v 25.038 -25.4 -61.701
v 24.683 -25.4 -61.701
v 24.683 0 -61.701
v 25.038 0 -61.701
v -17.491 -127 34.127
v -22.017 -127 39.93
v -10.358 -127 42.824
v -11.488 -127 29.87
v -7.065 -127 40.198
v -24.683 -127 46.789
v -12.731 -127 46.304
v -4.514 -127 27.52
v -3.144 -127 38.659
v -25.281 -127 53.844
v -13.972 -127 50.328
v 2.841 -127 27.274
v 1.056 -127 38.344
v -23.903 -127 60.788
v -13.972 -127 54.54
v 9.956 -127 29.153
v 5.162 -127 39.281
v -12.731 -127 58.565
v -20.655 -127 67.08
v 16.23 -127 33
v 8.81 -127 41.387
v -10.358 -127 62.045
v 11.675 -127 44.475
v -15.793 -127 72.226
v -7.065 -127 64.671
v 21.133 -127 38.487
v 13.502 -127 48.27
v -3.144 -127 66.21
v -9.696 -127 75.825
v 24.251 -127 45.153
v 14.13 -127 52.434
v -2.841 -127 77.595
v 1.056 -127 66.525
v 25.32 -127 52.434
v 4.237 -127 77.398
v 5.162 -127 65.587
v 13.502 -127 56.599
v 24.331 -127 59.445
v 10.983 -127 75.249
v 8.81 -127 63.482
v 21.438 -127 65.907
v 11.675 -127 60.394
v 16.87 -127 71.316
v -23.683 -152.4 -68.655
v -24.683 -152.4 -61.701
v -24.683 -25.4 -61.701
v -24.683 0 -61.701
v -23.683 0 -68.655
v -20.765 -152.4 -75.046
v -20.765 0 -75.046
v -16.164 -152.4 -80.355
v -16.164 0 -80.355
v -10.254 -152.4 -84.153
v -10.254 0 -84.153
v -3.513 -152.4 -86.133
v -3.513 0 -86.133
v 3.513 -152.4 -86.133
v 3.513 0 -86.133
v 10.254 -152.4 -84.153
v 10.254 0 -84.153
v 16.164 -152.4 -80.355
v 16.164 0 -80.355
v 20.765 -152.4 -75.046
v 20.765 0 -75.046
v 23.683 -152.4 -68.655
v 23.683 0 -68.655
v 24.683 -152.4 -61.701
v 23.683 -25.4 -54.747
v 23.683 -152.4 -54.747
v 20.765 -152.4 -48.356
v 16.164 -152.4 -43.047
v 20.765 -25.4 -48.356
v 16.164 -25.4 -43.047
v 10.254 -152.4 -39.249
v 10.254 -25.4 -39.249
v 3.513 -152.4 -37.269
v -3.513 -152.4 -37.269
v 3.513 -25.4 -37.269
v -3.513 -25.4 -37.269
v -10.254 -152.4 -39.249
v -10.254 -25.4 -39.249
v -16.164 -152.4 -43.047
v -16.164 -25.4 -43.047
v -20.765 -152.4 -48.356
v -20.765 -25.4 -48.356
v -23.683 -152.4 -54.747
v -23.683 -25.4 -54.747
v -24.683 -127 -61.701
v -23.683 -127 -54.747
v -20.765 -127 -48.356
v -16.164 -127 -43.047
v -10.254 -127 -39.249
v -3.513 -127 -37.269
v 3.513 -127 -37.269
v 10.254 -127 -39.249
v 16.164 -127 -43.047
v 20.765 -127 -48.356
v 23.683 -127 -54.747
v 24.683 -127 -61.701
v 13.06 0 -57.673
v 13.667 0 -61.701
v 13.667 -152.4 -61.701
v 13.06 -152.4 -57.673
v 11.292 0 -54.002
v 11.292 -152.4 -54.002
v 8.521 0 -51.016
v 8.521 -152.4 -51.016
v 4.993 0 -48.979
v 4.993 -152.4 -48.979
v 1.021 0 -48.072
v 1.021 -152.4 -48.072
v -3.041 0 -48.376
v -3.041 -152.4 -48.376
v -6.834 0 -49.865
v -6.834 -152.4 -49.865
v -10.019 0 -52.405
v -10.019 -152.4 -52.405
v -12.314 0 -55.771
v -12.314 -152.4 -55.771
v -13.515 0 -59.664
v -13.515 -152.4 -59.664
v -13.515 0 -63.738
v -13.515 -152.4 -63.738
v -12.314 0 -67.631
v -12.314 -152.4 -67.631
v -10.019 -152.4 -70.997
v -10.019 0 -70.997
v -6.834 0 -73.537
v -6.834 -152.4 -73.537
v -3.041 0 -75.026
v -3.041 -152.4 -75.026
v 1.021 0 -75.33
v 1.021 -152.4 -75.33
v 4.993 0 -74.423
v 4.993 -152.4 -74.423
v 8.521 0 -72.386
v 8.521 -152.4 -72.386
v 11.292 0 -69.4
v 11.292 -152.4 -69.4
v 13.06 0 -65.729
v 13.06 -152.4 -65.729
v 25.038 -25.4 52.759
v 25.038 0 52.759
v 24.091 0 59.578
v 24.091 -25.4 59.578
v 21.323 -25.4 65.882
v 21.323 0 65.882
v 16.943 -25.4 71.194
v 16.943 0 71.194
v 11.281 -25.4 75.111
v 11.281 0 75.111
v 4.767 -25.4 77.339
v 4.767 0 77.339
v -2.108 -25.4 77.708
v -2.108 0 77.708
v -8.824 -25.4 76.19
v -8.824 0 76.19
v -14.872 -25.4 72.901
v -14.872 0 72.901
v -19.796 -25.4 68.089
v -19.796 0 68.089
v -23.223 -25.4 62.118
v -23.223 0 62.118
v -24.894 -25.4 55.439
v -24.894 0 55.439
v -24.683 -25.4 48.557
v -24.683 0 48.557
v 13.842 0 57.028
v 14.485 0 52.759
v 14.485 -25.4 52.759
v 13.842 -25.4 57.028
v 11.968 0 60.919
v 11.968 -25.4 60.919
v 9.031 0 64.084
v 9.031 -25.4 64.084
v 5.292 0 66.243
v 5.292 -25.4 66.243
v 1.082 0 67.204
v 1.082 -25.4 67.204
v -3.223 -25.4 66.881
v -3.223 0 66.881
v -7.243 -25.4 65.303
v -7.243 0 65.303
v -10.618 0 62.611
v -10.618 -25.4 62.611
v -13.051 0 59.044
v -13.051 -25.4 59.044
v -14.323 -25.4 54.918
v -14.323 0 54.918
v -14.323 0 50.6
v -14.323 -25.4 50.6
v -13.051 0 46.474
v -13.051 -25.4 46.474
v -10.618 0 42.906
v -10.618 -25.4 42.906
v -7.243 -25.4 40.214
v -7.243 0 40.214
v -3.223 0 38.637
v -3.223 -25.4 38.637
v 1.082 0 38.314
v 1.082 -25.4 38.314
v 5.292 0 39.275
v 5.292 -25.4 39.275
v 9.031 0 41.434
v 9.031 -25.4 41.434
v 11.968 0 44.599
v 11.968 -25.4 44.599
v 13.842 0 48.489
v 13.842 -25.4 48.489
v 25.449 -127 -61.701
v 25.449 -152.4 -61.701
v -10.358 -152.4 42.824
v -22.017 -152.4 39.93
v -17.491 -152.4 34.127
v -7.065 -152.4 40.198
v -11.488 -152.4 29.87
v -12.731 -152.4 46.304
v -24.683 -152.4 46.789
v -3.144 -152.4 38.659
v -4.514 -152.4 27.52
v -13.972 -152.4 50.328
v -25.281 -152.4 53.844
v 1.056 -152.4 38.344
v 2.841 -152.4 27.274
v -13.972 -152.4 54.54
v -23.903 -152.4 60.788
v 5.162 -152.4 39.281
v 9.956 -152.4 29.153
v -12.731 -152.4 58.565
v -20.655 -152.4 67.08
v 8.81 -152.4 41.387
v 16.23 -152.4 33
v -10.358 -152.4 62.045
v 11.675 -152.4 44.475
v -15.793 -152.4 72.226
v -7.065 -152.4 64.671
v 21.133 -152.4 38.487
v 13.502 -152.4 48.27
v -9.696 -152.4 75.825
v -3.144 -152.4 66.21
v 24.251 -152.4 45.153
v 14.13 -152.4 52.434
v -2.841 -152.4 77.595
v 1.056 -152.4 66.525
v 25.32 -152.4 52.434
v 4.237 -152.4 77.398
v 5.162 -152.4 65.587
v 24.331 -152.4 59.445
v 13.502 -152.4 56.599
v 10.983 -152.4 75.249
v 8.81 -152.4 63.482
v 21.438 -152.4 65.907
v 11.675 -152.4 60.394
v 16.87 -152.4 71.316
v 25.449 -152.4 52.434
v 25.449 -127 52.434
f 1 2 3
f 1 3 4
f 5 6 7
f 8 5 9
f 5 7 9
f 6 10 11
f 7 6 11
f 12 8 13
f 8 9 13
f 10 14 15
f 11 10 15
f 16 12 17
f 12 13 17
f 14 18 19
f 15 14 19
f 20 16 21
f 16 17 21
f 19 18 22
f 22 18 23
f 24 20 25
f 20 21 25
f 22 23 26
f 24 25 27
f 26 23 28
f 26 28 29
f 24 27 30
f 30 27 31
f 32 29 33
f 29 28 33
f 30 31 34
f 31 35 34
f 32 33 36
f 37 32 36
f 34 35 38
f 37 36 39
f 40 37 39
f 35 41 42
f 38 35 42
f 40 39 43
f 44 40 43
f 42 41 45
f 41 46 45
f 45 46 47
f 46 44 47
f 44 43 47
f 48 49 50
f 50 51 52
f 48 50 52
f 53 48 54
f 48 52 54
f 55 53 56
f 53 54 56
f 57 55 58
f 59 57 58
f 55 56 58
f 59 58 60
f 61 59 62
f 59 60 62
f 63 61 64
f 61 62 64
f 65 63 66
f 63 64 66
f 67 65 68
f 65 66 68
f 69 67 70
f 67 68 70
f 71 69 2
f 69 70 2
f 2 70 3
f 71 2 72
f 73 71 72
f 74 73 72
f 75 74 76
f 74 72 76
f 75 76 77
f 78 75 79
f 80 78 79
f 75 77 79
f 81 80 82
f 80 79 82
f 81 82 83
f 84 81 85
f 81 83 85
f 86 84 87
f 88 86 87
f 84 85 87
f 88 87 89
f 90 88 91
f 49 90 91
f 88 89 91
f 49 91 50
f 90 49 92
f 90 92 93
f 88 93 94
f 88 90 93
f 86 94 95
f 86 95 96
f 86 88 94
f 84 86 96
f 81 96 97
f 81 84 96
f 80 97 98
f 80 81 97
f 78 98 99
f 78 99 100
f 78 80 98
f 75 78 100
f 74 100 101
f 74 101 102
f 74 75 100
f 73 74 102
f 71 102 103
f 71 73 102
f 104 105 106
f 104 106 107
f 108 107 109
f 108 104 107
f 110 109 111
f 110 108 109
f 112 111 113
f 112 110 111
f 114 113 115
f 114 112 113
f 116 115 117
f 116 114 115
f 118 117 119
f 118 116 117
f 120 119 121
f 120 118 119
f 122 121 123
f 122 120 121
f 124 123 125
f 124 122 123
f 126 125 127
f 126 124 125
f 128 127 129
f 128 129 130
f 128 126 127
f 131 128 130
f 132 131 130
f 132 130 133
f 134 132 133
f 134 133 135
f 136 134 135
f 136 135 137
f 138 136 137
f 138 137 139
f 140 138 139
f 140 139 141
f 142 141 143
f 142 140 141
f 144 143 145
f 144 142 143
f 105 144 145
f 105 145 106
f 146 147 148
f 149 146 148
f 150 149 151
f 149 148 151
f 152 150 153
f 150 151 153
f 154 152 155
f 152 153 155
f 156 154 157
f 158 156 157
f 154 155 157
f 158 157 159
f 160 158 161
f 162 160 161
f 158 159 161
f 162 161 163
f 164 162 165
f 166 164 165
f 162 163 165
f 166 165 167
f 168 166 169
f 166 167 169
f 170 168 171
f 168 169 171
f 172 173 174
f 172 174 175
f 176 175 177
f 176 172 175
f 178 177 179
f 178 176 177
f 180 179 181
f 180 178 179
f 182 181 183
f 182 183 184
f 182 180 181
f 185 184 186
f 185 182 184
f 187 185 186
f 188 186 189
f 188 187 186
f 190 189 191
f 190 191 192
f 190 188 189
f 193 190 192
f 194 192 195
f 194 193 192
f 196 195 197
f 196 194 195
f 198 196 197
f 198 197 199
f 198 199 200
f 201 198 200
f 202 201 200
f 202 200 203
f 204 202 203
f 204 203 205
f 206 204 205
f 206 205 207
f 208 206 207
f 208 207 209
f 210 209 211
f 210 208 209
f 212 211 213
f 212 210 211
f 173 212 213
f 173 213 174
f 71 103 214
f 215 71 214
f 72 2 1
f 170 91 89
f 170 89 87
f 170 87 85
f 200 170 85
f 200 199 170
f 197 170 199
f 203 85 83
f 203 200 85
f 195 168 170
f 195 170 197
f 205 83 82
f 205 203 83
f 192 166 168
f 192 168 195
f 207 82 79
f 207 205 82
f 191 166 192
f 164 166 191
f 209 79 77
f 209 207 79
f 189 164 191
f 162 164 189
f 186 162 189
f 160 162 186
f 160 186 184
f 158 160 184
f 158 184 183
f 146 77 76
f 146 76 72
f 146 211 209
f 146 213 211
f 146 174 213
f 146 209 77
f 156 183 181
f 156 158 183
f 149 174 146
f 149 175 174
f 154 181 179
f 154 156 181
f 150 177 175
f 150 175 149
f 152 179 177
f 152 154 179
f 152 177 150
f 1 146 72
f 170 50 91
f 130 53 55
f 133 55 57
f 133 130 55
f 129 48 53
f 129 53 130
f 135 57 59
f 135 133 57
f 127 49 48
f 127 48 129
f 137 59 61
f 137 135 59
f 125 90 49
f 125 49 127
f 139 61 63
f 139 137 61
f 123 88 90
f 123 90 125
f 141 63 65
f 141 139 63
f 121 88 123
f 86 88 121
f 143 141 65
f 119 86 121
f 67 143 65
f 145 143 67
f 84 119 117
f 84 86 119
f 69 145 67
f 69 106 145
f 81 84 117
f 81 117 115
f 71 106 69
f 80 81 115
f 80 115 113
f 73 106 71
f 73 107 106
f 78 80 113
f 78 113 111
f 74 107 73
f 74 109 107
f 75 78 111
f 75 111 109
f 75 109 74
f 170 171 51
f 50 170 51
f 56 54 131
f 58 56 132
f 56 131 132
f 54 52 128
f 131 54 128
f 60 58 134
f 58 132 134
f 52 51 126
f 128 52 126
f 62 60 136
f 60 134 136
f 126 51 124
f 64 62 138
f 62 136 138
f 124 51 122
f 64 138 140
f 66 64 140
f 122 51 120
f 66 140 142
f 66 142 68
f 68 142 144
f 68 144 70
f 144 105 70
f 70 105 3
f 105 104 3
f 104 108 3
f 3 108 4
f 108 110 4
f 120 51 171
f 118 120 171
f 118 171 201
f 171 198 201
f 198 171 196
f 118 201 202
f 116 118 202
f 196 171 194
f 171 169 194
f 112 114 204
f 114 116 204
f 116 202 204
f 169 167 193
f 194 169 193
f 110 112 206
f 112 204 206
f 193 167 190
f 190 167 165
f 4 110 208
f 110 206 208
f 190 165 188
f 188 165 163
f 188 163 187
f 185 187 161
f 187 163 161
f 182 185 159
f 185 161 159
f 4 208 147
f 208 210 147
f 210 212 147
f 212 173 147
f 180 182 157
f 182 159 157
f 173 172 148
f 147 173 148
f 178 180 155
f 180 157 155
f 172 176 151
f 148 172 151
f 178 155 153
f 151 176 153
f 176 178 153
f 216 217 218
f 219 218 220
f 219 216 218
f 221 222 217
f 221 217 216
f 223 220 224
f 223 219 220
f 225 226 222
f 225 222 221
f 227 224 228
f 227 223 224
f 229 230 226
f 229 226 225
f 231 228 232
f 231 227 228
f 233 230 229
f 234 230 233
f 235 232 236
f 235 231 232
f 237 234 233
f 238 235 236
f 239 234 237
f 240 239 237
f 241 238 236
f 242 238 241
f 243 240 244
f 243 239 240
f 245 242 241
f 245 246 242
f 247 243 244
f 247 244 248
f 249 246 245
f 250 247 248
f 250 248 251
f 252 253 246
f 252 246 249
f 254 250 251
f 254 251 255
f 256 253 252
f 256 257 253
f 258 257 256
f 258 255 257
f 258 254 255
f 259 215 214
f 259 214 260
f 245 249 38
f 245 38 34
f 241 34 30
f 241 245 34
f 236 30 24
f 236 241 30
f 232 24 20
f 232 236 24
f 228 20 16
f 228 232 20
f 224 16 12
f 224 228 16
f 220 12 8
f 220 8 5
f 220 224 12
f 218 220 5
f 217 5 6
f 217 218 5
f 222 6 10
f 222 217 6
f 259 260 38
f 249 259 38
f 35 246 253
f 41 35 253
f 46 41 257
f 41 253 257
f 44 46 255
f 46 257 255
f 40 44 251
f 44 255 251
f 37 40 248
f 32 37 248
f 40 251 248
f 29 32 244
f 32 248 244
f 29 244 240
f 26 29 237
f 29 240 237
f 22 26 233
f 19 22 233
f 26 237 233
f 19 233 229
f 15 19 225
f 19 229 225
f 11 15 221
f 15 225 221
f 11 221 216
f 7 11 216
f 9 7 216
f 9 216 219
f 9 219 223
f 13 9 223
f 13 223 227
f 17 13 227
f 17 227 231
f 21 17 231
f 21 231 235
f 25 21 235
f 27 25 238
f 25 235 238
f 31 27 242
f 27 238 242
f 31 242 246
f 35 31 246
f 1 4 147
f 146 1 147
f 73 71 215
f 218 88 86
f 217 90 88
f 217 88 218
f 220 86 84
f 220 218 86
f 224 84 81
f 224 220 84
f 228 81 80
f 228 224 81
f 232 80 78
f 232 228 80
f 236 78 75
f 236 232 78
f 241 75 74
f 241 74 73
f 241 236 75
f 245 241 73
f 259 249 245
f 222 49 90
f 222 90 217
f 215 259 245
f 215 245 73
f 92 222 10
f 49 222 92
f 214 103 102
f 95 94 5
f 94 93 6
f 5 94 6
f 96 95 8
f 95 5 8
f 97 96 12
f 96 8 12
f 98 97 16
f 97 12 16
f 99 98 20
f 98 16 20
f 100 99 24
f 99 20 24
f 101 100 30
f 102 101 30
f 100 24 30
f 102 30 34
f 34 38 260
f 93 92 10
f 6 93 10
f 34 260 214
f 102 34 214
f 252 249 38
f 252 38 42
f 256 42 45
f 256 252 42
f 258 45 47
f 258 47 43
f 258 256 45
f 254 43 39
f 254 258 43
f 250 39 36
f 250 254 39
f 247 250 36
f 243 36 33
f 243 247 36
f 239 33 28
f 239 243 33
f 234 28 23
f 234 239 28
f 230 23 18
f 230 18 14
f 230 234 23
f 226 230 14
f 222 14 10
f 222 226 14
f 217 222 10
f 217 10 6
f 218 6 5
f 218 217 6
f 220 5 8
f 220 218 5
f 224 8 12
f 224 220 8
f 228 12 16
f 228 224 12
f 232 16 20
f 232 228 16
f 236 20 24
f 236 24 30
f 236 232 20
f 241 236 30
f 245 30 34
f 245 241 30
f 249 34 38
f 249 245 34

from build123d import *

# Parameters (mm, degrees)
F0_R     = 14.485219
F1_DEPTH = 25.4
F2_DEPTH = 25.4
F0_R_2   = 13.667199
F3_DEPTH = 152.4
F5_DEPTH = 25.4
F4_R     = 14.12985
F6_DEPTH = 25.4


with BuildPart() as f1:
    # F0 (on Front) → F1 (new body)
    with BuildSketch(Plane.XZ):
        with BuildLine():
            ThreePointArc((25.038091, 52.758828), (-2.10842, 77.707988), (-24.682998, 48.556965))
            ThreePointArc((-24.682998, 48.556965), (2.10842, 27.809668), (25.038091, 52.758828))
        make_face()
        with Locations((0, 52.758828)):
            Circle(F0_R, mode=Mode.SUBTRACT)
    extrude(amount=F1_DEPTH)

    # F0 (on Front) → F2 (join)
    with BuildSketch(Plane.XZ):
        with BuildLine():
            ThreePointArc((-24.682998, -61.701007), (0, -37.01801), (24.682998, -61.701007))
            Line((24.682998, -61.701007), (25.038091, -61.701007))
            Line((25.038091, -61.701007), (25.038091, 52.758828))
            ThreePointArc((25.038091, 52.758828), (2.10842, 27.809668), (-24.682998, 48.556965))
            Line((-24.682998, 48.556965), (-24.682998, -61.701007))
        make_face()
    extrude(amount=F2_DEPTH)

    # F0 (on Front) → F3 (join)
    with BuildSketch(Plane.XZ):
        with BuildLine():
            ThreePointArc((-24.682998, -61.701007), (0, -86.384005), (24.682998, -61.701007))
            ThreePointArc((24.682998, -61.701007), (0, -37.01801), (-24.682998, -61.701007))
        make_face()
        with Locations((0, -61.701007)):
            Circle(F0_R_2, mode=Mode.SUBTRACT)
    extrude(amount=F3_DEPTH)


with BuildPart() as f5:
    # F4 (on face) → F5 (new body)
    with BuildSketch(Plane.XZ.offset(152.4)):
        with BuildLine():
            Line((-24.682998, 46.788897), (-24.682998, -61.701007))
            ThreePointArc((-24.682998, -61.701007), (0, -37.01801), (24.682998, -61.701007))
            Line((24.682998, -61.701007), (25.449321, -61.701007))
            Line((25.449321, -61.701007), (25.449321, 52.43437))
            Line((25.449321, 52.43437), (25.320382, 52.43437))
            ThreePointArc((25.320382, 52.43437), (2.84067, 27.273839), (-24.682998, 46.788897))
        make_face()
    extrude(amount=-F5_DEPTH)


with BuildPart() as f6:
    # F4 (on face) → F6 (new body)
    with BuildSketch(Plane.XZ.offset(152.4)):
        with BuildLine():
            ThreePointArc((25.320382, 52.43437), (-2.84067, 77.594901), (-24.682998, 46.788897))
            ThreePointArc((-24.682998, 46.788897), (2.84067, 27.273839), (25.320382, 52.43437))
        make_face()
        with Locations((0, 52.43437)):
            Circle(F4_R, mode=Mode.SUBTRACT)
    extrude(amount=-F6_DEPTH)


solid = Compound([f1.part, f5.part, f6.part])
